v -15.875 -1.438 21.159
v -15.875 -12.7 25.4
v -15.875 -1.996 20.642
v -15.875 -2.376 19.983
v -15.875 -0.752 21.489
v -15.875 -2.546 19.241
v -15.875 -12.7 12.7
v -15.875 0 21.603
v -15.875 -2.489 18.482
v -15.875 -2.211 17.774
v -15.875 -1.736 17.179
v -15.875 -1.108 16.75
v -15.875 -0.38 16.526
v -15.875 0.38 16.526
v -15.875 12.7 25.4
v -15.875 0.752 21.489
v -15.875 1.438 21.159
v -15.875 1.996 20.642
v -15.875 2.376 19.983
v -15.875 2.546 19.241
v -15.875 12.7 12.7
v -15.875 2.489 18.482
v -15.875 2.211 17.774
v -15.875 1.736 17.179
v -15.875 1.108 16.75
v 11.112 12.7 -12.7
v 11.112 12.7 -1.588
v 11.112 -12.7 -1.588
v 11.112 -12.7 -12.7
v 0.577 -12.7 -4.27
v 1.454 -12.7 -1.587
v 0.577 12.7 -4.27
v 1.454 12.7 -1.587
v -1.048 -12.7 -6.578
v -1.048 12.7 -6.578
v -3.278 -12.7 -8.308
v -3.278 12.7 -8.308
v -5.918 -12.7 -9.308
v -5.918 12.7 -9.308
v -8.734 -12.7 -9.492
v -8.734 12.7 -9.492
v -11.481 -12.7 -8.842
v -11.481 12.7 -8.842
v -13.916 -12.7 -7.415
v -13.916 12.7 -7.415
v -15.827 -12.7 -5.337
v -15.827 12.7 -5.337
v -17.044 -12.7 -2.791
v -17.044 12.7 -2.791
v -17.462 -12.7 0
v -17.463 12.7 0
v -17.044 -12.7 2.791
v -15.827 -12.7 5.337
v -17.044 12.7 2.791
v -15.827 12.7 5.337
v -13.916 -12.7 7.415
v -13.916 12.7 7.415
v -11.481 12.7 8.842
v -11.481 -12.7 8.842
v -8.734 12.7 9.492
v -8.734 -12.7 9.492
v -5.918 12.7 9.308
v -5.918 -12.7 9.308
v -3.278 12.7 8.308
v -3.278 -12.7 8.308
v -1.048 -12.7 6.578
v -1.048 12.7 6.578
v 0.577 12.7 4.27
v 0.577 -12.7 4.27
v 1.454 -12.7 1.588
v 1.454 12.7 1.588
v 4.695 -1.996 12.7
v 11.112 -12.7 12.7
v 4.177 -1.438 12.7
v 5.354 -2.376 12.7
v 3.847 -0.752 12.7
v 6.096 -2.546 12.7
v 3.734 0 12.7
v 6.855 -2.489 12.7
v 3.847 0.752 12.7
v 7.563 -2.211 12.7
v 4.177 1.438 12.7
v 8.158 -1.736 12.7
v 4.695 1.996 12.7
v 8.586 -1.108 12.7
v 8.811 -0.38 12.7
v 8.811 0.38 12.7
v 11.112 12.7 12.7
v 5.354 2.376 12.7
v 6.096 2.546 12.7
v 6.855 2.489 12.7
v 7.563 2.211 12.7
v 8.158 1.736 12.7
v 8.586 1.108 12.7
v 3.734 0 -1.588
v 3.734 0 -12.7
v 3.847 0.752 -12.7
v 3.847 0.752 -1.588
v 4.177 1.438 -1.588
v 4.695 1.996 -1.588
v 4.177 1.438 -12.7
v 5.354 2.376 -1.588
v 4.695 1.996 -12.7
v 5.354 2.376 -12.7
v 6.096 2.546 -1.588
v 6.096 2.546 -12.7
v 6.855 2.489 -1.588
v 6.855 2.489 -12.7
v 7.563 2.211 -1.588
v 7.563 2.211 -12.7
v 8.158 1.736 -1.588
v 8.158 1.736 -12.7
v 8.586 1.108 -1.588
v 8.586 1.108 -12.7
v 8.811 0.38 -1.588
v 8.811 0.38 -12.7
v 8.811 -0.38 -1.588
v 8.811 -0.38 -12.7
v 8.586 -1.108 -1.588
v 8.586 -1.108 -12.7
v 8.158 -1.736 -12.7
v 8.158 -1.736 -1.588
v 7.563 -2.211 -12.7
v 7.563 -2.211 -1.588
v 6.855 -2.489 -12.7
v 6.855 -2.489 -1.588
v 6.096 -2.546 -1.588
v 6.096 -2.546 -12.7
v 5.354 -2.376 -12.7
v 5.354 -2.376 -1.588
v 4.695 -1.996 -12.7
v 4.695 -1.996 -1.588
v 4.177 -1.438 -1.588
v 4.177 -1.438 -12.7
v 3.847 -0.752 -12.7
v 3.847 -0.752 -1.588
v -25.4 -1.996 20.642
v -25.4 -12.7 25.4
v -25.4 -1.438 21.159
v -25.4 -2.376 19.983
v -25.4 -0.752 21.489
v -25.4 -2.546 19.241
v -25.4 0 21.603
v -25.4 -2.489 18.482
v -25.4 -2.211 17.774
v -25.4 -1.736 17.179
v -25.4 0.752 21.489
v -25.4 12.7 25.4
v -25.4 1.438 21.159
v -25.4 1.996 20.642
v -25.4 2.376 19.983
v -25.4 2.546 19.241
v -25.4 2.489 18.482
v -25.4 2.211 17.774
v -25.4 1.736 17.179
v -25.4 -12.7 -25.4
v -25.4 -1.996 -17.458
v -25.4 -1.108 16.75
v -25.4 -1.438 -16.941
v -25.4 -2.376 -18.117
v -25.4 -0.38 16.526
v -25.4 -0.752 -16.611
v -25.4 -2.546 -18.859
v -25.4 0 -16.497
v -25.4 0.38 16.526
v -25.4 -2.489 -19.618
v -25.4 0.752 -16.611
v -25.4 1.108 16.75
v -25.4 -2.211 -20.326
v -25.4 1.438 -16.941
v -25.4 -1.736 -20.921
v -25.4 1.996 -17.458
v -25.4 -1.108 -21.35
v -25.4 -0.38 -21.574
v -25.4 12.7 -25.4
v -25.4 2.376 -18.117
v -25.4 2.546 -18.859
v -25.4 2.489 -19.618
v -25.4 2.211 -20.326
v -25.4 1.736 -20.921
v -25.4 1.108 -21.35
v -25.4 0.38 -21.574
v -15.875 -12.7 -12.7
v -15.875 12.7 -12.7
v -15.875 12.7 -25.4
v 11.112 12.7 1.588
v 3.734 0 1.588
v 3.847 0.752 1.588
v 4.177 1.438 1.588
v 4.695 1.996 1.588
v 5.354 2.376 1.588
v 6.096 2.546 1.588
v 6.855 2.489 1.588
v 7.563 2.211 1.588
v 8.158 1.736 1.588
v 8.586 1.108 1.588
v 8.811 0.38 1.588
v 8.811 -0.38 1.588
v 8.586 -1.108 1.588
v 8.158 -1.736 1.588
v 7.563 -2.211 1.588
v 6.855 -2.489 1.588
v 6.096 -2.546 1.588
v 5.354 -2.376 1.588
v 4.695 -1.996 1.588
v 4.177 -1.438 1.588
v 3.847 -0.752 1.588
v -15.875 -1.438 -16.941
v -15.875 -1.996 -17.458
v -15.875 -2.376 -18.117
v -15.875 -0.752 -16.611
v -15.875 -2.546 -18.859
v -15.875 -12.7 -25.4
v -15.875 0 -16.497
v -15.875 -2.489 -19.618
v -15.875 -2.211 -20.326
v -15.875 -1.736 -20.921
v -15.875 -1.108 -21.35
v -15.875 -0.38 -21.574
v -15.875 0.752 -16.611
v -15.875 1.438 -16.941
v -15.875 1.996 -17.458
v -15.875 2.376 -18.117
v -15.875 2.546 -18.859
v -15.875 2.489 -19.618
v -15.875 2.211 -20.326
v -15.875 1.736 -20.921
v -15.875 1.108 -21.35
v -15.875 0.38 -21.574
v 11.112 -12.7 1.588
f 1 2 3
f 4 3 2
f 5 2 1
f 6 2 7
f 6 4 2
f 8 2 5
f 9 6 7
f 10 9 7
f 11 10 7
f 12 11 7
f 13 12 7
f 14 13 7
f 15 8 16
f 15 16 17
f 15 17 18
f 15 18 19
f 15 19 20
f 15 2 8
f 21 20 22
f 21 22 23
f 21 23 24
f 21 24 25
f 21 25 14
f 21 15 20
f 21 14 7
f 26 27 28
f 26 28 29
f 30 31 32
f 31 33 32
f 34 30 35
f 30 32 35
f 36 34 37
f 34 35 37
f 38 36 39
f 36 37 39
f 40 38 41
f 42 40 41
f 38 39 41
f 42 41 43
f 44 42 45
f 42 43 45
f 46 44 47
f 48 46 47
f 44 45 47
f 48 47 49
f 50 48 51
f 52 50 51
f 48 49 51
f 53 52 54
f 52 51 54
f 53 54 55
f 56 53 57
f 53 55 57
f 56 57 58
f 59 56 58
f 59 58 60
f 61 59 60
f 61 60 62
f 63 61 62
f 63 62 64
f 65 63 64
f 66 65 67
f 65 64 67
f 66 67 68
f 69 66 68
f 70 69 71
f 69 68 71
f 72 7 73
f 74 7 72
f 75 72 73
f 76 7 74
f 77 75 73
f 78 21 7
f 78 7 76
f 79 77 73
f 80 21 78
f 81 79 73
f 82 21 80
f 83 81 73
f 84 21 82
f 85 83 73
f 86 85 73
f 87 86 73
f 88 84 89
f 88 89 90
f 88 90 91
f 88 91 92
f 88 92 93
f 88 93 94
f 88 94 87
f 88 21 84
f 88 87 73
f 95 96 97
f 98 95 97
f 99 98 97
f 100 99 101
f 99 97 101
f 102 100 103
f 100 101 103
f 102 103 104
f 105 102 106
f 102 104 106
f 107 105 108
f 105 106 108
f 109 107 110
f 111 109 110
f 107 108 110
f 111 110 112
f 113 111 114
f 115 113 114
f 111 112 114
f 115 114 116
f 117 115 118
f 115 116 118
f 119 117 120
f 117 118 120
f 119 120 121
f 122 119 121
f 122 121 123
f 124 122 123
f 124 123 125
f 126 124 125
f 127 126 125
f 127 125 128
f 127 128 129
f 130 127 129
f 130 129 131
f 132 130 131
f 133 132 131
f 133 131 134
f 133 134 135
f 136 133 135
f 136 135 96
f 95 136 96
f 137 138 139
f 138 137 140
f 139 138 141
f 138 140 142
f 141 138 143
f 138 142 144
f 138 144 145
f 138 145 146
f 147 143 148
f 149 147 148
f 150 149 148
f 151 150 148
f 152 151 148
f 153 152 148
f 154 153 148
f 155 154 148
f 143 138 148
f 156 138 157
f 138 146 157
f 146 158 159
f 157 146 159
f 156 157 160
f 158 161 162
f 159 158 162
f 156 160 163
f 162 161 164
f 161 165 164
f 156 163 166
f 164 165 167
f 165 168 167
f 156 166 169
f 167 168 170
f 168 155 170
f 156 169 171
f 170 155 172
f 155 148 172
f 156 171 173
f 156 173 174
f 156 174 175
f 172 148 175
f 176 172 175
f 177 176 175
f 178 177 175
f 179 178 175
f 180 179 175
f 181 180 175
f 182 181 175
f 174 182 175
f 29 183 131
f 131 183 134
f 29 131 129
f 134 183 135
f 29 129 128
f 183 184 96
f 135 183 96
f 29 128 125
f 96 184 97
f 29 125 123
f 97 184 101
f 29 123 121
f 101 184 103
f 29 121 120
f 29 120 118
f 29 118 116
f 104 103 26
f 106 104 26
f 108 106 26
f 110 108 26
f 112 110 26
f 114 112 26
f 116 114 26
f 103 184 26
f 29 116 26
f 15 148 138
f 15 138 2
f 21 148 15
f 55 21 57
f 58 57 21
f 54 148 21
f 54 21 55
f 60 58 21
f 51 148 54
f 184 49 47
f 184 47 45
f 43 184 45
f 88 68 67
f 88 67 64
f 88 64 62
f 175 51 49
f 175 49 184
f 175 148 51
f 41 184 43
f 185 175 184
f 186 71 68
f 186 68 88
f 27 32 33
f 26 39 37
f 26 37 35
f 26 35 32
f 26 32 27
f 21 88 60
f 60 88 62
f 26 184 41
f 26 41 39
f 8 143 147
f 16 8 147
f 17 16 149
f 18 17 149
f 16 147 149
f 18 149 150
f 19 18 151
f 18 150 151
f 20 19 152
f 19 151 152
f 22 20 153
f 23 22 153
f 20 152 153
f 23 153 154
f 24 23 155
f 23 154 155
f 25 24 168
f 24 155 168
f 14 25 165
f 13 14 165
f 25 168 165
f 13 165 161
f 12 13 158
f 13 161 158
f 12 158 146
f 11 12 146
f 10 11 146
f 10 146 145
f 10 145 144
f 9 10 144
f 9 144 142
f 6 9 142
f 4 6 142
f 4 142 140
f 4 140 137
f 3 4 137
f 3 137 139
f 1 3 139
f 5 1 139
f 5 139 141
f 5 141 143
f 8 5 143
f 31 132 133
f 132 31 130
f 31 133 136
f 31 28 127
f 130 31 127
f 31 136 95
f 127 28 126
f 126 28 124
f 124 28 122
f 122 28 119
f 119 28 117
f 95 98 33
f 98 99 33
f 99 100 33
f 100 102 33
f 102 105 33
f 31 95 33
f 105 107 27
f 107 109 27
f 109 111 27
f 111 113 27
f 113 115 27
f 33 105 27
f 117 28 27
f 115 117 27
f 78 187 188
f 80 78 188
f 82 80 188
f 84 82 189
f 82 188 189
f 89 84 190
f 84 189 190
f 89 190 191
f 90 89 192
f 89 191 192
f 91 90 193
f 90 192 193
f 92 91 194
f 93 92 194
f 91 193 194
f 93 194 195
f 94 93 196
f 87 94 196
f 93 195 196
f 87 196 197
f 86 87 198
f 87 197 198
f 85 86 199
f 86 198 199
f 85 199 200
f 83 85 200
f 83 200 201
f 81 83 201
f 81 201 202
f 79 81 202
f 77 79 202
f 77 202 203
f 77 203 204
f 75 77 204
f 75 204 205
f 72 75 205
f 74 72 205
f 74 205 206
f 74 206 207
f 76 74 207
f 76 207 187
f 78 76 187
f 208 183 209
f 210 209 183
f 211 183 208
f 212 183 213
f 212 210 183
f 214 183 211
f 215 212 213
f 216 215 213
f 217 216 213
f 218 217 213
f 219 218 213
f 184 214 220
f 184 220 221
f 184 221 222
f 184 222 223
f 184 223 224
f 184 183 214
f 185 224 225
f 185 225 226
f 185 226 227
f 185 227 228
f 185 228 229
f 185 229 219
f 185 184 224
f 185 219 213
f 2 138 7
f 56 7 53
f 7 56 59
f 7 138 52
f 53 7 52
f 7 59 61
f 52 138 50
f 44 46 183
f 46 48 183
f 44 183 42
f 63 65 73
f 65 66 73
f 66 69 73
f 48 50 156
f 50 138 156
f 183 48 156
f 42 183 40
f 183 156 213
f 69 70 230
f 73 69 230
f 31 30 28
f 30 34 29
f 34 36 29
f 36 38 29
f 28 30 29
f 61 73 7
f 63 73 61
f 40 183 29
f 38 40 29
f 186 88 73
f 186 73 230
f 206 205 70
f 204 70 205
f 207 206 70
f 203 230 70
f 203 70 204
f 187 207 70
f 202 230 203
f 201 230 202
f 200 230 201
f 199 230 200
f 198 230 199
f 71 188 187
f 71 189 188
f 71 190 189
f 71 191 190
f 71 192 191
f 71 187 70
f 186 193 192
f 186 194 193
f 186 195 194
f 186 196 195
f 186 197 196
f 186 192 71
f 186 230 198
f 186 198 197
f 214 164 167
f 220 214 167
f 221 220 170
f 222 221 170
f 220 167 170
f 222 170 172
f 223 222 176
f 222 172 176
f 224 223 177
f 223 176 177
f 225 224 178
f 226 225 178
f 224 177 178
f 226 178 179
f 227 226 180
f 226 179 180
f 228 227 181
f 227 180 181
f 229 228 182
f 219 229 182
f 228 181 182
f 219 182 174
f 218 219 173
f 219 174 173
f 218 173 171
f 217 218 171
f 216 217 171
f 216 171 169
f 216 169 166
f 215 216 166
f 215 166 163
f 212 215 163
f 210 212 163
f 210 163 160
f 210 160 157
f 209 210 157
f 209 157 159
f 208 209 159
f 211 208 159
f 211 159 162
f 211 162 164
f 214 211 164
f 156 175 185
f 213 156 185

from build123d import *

# Parameters (mm, degrees)
SKETCH1_W                   = 50.8
SKETCH1_H                   = 50.8
STOCK_BLOCK_DEPTH           = 12.7
SKETCH2_R                   = 9.525
SLEEVE_NUT_HOLE_LARGE_DEPTH = 44.994090512
SKETCH11_W                  = 14.2875
SKETCH11_H                  = 50.8
CUT_EXTRUDE4_DEPTH          = 44.994090512
SKETCH3_W                   = 26.9875
SKETCH3_H                   = 12.7
CUT_EXTRUDE2_DEPTH          = 44.994090512
F_10_CLEARANCE_HOLE1_D      = 5.1054
SKETCH6_W                   = 3.175
SKETCH6_H                   = 37.090012852
CUT_EXTRUDE3_DEPTH          = 24.13
F_10_CLEARANCE_HOLE2_D      = 5.1054


with BuildPart() as part:
    # Sketch1 → Stock block (new, symmetric)
    with BuildSketch(Plane(origin=(0, 0, 0), x_dir=(1, 0, 0), z_dir=(0, 1, 0))):
        Rectangle(SKETCH1_W, SKETCH1_H)
    extrude(amount=STOCK_BLOCK_DEPTH, both=True)

    # Sketch2 → Sleeve Nut Hole - Large (cut, through all)
    with BuildSketch(Plane(origin=(0, 12.7, 0), x_dir=(1, 0, 0), z_dir=(0, 1, 0))):
        with Locations(Location((-7.9375, 0, 0), (0, 0, 270))):
            Circle(SKETCH2_R)
    extrude(amount=-SLEEVE_NUT_HOLE_LARGE_DEPTH, mode=Mode.SUBTRACT)

    # Sketch11 → Cut-Extrude4 (cut, through all)
    with BuildSketch(Plane(origin=(0, 12.7, 0), x_dir=(1, 0, 0), z_dir=(0, 1, 0))):
        with Locations((18.25625, 0)):
            Rectangle(SKETCH11_W, SKETCH11_H)
    extrude(amount=-CUT_EXTRUDE4_DEPTH, mode=Mode.SUBTRACT)

    # Sketch3 → Cut-Extrude2 (cut, through all)
    with BuildSketch(Plane(origin=(0, 12.7, 0), x_dir=(1, 0, 0), z_dir=(0, 1, 0))):
        with Locations((-2.38125, 19.05)):
            Rectangle(SKETCH3_W, SKETCH3_H)
        with Locations((-2.38125, -19.05)):
            Rectangle(SKETCH3_W, SKETCH3_H)
    extrude(amount=-CUT_EXTRUDE2_DEPTH, mode=Mode.SUBTRACT)

    # #10 Clearance Hole1 (through all)
    with Locations(Plane(origin=(-15.875, 0, 0), x_dir=(0, 0, -1), z_dir=(1, 0, 0))):
        with Locations((-19.05, 0), (19.05, 0)):
            Hole(F_10_CLEARANCE_HOLE1_D / 2)

    # Sketch6 → Cut-Extrude3 (cut)
    with BuildSketch(Plane(origin=(11.1125, 0, 0), x_dir=(0, 0, -1), z_dir=(1, 0, 0))):
        Rectangle(SKETCH6_W, SKETCH6_H)
    extrude(amount=-CUT_EXTRUDE3_DEPTH, mode=Mode.SUBTRACT)

    # #10 Clearance Hole2 (through all)
    with Locations(Plane.XY.offset(12.7)):
        with Locations((6.2865, 0)):
            Hole(F_10_CLEARANCE_HOLE2_D / 2)


solid = part.part
